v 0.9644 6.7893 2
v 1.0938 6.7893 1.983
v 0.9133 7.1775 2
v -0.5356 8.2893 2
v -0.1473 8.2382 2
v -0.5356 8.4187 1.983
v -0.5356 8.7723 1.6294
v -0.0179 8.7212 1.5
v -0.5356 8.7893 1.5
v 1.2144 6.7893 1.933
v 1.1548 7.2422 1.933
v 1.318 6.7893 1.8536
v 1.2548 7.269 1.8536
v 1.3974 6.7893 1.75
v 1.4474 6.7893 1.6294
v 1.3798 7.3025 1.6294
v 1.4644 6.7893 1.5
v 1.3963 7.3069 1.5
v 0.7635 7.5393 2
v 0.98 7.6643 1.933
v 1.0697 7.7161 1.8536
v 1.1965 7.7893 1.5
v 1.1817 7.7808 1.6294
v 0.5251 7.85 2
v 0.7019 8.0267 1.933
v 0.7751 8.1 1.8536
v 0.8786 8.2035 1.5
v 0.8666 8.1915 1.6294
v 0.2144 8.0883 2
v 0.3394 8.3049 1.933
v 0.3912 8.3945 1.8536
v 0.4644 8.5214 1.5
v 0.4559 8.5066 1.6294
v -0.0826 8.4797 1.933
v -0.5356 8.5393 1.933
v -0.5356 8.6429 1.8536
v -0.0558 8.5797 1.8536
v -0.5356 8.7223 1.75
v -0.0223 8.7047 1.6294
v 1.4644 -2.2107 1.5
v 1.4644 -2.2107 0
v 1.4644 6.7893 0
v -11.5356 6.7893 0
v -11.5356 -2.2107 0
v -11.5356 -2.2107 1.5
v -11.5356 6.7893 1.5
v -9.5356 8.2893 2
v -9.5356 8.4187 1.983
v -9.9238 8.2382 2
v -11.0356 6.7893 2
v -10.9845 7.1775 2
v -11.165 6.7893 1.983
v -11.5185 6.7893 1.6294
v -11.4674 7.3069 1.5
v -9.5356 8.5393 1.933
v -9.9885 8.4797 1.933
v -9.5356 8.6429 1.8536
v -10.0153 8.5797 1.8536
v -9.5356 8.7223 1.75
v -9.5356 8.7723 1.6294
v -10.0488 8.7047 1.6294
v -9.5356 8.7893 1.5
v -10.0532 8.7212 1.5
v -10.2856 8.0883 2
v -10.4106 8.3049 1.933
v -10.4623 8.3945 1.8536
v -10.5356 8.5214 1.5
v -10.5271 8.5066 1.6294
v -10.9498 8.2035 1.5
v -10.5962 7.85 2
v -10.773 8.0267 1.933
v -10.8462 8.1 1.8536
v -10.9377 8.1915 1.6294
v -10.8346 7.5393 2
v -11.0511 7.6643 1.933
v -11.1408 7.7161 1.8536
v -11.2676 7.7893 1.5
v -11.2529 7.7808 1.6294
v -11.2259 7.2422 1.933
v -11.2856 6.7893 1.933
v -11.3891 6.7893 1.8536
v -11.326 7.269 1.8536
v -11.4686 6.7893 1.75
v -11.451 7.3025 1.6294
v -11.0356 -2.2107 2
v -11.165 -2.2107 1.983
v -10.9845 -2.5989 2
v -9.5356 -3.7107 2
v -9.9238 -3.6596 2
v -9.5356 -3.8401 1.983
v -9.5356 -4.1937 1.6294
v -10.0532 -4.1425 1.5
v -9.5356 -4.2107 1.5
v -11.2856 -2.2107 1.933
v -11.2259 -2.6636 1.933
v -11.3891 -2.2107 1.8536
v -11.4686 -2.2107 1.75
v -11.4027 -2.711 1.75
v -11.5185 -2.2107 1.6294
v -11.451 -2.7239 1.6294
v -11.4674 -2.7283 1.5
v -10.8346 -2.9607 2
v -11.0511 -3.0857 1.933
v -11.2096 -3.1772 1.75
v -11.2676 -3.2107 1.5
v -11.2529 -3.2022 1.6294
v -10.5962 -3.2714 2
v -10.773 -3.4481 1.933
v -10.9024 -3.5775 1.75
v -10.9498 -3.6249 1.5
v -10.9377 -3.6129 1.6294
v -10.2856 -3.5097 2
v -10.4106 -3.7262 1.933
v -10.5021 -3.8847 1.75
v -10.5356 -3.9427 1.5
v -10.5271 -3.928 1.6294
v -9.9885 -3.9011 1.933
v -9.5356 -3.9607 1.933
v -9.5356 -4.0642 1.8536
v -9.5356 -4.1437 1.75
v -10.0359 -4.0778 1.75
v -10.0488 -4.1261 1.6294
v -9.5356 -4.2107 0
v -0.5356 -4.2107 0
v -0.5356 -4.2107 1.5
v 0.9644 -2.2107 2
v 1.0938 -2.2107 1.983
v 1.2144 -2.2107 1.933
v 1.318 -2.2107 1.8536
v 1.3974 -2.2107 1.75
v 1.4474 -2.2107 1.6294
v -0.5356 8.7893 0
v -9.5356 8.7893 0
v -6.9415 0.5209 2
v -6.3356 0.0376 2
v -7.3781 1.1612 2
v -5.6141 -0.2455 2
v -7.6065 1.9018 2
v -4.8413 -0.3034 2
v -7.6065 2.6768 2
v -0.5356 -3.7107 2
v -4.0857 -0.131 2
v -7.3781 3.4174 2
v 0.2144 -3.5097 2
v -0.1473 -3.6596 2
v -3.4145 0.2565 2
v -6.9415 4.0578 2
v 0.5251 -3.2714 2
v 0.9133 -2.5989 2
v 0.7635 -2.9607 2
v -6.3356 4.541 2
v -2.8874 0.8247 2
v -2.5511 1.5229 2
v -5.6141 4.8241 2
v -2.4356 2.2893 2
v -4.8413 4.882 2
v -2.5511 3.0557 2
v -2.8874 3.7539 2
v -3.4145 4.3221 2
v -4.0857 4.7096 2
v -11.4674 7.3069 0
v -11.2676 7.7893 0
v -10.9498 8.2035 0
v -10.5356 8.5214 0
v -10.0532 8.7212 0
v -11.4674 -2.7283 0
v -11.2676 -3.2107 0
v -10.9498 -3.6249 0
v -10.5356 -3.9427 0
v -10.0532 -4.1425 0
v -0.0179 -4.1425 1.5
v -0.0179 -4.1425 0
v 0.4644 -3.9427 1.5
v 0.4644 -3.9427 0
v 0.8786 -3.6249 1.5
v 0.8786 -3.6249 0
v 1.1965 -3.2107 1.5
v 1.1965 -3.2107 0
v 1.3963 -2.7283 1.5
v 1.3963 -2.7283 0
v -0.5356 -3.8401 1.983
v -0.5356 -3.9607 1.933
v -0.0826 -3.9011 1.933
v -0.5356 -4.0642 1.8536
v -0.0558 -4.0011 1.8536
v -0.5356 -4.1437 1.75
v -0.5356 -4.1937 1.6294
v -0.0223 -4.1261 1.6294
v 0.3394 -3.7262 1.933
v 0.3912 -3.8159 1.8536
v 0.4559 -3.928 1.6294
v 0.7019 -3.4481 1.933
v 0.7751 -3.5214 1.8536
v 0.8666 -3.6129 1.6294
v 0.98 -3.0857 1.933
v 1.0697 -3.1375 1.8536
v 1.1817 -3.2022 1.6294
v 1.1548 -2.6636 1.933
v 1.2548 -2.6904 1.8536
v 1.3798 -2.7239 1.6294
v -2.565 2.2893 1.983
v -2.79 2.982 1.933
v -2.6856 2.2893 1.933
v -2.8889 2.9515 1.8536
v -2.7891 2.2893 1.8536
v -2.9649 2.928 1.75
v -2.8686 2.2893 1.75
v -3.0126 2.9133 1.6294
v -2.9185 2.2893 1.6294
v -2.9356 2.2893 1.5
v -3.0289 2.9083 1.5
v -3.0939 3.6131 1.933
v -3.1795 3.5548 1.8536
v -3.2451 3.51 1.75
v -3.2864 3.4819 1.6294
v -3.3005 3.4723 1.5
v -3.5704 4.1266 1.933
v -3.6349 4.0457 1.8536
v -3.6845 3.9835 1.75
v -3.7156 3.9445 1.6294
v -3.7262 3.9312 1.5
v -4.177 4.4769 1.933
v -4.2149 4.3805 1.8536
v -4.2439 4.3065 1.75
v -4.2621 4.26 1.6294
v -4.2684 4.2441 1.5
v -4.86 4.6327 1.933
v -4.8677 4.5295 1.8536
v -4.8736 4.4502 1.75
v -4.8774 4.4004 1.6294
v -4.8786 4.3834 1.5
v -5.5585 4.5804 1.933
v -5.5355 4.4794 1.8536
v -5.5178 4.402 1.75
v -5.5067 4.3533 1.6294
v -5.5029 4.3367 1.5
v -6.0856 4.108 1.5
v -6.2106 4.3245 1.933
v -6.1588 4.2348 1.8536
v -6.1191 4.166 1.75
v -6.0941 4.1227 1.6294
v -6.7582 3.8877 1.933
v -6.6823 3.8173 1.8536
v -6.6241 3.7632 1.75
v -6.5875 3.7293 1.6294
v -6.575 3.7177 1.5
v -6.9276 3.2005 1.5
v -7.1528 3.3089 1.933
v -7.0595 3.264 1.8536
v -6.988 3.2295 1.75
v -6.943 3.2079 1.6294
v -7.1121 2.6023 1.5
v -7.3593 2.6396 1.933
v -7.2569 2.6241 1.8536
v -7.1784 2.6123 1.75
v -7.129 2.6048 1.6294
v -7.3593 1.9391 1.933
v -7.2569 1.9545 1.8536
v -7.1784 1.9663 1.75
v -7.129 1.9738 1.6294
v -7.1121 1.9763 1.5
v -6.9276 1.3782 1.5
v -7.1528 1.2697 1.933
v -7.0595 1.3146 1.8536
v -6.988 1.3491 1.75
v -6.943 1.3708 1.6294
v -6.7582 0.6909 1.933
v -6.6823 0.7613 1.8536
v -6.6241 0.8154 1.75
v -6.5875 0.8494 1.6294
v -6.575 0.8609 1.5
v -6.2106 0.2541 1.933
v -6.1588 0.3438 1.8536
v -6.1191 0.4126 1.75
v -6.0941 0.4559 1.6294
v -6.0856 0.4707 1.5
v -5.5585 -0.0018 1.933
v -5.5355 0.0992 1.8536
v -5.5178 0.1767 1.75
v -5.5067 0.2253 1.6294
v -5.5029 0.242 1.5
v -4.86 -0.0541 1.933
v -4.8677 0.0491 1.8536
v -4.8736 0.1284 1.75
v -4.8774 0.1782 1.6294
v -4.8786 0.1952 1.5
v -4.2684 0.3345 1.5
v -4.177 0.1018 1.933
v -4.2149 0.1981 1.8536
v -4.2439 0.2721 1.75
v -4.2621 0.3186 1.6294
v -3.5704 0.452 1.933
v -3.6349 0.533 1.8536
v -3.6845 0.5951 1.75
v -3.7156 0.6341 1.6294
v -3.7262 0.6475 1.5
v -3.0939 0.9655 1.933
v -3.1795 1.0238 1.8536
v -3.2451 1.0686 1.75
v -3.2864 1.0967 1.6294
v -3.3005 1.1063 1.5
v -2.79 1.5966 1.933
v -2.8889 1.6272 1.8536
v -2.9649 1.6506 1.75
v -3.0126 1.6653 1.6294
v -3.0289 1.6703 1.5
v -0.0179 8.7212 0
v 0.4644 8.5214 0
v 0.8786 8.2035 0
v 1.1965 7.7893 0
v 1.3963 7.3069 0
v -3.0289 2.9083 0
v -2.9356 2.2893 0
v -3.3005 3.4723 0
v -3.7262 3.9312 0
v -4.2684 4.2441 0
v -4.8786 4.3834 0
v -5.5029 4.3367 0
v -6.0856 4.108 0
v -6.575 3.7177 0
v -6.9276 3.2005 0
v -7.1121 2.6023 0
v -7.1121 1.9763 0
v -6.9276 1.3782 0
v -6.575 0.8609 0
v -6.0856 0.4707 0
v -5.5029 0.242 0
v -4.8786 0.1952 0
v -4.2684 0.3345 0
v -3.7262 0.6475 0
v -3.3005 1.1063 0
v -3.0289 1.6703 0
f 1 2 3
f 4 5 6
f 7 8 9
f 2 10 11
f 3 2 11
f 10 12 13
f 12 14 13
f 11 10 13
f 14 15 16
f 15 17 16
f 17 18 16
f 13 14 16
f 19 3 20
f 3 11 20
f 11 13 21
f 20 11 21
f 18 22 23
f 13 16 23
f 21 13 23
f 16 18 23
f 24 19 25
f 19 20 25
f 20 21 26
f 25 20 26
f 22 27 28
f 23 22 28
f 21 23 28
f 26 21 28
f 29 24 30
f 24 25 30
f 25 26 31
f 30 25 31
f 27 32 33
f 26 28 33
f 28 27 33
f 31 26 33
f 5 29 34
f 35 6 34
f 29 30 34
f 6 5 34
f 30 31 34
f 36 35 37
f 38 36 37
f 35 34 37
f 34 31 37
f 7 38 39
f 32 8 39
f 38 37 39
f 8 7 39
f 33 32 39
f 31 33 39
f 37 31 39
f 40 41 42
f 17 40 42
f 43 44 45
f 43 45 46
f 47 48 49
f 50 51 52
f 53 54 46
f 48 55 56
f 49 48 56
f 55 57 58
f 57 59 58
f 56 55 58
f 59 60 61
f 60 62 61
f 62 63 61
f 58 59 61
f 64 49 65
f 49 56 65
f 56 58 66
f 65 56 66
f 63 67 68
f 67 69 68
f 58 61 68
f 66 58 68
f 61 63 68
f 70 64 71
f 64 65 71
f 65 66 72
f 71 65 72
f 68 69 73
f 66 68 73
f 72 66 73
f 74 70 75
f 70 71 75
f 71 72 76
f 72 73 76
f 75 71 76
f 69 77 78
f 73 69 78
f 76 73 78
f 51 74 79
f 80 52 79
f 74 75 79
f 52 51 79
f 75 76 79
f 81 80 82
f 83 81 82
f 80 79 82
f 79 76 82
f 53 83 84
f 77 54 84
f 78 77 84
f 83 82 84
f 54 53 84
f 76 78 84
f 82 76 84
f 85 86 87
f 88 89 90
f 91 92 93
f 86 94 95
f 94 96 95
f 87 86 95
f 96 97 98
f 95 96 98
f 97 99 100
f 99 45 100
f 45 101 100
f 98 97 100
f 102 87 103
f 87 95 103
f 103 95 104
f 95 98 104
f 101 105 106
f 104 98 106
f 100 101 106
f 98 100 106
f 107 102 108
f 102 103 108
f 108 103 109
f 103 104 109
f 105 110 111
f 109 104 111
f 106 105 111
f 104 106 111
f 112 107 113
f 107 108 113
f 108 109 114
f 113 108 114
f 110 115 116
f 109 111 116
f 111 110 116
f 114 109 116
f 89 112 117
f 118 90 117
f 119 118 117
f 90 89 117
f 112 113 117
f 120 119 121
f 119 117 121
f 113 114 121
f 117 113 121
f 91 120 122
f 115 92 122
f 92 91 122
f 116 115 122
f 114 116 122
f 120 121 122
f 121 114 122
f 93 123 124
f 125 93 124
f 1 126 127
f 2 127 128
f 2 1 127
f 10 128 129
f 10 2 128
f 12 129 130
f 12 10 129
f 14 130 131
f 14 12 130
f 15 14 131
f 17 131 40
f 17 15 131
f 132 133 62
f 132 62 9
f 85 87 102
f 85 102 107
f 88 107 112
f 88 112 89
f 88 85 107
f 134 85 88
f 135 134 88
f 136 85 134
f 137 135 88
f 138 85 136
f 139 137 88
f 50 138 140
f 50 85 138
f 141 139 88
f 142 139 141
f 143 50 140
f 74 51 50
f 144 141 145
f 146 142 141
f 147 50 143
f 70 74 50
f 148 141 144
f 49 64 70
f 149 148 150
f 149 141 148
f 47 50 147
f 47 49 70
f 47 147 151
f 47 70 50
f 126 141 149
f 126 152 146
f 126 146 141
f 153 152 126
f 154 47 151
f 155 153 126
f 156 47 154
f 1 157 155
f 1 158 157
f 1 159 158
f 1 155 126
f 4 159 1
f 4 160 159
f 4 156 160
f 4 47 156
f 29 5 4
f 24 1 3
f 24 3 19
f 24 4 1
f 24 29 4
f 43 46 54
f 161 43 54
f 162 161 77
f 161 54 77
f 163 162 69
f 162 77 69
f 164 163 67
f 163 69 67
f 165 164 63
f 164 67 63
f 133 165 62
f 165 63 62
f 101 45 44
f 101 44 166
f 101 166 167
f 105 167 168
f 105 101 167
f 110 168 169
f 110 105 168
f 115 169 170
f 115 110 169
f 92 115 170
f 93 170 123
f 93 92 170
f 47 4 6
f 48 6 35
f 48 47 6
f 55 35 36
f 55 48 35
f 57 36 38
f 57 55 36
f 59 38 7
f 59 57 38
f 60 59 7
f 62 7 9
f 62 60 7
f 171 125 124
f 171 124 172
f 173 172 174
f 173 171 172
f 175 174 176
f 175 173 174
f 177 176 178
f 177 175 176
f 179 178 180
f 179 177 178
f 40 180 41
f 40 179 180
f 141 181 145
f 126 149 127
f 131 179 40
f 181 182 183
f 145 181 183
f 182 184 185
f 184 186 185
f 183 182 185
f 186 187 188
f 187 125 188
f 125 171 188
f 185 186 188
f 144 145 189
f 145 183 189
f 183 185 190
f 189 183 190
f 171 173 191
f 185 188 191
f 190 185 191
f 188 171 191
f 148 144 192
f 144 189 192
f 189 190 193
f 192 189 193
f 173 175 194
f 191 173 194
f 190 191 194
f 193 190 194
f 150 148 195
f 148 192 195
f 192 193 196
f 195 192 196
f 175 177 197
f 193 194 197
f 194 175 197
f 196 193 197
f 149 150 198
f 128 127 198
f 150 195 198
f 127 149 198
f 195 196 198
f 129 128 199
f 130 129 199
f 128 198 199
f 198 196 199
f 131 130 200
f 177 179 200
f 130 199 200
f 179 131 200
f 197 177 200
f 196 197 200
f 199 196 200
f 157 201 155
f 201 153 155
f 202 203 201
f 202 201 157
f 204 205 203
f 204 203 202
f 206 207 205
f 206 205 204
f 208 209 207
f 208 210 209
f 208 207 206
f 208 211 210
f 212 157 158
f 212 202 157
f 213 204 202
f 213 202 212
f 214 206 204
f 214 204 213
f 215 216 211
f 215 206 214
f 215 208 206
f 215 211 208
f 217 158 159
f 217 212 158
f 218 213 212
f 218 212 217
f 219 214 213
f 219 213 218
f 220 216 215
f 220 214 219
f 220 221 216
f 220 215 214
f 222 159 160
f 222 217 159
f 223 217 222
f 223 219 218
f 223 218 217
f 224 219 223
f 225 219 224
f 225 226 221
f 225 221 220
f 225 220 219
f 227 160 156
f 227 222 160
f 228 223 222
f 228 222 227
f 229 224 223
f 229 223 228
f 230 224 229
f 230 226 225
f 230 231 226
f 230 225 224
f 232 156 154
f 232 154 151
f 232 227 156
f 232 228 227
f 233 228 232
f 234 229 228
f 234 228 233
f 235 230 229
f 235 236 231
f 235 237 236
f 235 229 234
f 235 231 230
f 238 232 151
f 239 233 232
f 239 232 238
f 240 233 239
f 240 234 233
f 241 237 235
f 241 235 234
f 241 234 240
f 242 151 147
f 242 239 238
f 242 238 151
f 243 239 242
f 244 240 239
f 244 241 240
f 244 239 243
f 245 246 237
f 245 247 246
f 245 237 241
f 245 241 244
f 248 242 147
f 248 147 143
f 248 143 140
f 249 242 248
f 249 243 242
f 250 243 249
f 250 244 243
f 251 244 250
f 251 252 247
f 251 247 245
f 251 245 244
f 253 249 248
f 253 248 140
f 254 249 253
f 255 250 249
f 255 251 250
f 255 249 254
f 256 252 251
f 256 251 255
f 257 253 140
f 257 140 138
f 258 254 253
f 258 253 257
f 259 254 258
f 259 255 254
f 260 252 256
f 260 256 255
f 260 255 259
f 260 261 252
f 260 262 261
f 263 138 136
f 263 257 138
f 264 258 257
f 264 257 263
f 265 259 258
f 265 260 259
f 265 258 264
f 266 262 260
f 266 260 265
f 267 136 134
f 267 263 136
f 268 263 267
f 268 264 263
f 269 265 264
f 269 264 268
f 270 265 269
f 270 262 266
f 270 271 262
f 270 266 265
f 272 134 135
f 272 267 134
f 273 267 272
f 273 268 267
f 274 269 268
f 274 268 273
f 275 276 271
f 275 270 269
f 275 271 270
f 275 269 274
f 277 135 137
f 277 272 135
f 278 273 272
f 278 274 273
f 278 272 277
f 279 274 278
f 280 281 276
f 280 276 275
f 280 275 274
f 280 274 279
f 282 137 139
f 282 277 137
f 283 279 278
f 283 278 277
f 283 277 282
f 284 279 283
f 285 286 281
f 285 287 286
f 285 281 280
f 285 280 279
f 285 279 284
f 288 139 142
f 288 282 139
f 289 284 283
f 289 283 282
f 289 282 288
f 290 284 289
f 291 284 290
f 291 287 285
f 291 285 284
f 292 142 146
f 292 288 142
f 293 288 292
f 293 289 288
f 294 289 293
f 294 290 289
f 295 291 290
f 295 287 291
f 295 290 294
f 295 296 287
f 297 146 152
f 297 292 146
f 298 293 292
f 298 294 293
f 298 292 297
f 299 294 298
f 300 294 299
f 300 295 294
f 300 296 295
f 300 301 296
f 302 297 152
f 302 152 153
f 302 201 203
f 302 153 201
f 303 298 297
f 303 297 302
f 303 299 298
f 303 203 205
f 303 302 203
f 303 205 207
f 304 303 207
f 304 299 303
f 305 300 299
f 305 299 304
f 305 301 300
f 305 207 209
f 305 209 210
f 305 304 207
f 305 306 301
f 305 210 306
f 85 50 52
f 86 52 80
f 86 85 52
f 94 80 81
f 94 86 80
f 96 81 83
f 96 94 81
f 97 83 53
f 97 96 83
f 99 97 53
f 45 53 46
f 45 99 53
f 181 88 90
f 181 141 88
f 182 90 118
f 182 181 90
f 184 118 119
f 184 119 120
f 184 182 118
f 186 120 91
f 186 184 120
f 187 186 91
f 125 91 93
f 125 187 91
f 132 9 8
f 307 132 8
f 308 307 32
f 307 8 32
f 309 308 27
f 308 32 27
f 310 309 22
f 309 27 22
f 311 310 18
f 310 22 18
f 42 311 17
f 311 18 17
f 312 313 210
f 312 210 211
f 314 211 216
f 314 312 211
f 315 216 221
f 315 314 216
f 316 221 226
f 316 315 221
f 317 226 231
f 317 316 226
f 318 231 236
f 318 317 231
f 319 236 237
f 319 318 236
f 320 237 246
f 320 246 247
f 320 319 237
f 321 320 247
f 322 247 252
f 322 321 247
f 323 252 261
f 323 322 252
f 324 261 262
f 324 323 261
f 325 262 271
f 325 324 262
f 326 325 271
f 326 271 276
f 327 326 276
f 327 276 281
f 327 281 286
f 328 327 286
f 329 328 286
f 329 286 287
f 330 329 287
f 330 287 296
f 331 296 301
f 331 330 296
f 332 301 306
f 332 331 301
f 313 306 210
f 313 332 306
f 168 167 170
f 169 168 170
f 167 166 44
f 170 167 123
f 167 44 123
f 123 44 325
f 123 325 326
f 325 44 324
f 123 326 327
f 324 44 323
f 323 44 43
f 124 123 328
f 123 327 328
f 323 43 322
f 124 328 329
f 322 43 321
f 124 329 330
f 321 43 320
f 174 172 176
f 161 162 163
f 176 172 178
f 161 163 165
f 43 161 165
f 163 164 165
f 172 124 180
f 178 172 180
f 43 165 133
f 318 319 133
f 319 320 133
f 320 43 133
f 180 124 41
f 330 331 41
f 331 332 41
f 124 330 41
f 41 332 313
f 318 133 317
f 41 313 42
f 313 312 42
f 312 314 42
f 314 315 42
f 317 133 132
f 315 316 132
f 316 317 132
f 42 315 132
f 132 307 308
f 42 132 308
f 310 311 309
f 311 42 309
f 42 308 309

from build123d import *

# Parameters (mm, degrees)
ESQUISSE1_W        = 13
ESQUISSE1_H        = 13
ESQUISSE1_R        = 2.1
BOSS_EXTRU_1_DEPTH = 2
CONG_1_R           = 2
CONG_2_R           = 0.5


with BuildPart() as part:
    # Esquisse1 → Boss.-Extru.1 (new body)
    with BuildSketch(Plane.XY):
        with Locations((-5.035571526, 2.289308176)):
            Rectangle(ESQUISSE1_W, ESQUISSE1_H)
        with Locations((-5.035571526, 2.289308176)):
            Circle(ESQUISSE1_R, mode=Mode.SUBTRACT)
    extrude(amount=BOSS_EXTRU_1_DEPTH)

    # Congé1
    cong_1_edges = [part.edges().sort_by_distance(p)[0] for p in [
        (1.464428474, -4.210691824, 1),
        (-11.535571526, -4.210691824, 1),
        (-11.535571526, 8.789308176, 1),
        (1.464428474, 8.789308176, 1),
    ]]
    fillet(cong_1_edges, radius=CONG_1_R)

    # Congé2
    cong_2_edges = [part.edges().sort_by_distance(p)[0] for p in [
        (-7.135571526, 2.289308176, 2),
        (-5.035571526, -4.210691824, 2),
        (-11.535571526, 2.289308176, 2),
        (1.464428474, 2.289308176, 2),
        (-5.035571526, 8.789308176, 2),
        (0.878642036, 8.203521738, 2),
        (-10.949785089, 8.203521738, 2),
        (0.878642036, -3.624905386, 2),
        (-10.949785089, -3.624905386, 2),
    ]]
    fillet(cong_2_edges, radius=CONG_2_R)


solid = part.part
